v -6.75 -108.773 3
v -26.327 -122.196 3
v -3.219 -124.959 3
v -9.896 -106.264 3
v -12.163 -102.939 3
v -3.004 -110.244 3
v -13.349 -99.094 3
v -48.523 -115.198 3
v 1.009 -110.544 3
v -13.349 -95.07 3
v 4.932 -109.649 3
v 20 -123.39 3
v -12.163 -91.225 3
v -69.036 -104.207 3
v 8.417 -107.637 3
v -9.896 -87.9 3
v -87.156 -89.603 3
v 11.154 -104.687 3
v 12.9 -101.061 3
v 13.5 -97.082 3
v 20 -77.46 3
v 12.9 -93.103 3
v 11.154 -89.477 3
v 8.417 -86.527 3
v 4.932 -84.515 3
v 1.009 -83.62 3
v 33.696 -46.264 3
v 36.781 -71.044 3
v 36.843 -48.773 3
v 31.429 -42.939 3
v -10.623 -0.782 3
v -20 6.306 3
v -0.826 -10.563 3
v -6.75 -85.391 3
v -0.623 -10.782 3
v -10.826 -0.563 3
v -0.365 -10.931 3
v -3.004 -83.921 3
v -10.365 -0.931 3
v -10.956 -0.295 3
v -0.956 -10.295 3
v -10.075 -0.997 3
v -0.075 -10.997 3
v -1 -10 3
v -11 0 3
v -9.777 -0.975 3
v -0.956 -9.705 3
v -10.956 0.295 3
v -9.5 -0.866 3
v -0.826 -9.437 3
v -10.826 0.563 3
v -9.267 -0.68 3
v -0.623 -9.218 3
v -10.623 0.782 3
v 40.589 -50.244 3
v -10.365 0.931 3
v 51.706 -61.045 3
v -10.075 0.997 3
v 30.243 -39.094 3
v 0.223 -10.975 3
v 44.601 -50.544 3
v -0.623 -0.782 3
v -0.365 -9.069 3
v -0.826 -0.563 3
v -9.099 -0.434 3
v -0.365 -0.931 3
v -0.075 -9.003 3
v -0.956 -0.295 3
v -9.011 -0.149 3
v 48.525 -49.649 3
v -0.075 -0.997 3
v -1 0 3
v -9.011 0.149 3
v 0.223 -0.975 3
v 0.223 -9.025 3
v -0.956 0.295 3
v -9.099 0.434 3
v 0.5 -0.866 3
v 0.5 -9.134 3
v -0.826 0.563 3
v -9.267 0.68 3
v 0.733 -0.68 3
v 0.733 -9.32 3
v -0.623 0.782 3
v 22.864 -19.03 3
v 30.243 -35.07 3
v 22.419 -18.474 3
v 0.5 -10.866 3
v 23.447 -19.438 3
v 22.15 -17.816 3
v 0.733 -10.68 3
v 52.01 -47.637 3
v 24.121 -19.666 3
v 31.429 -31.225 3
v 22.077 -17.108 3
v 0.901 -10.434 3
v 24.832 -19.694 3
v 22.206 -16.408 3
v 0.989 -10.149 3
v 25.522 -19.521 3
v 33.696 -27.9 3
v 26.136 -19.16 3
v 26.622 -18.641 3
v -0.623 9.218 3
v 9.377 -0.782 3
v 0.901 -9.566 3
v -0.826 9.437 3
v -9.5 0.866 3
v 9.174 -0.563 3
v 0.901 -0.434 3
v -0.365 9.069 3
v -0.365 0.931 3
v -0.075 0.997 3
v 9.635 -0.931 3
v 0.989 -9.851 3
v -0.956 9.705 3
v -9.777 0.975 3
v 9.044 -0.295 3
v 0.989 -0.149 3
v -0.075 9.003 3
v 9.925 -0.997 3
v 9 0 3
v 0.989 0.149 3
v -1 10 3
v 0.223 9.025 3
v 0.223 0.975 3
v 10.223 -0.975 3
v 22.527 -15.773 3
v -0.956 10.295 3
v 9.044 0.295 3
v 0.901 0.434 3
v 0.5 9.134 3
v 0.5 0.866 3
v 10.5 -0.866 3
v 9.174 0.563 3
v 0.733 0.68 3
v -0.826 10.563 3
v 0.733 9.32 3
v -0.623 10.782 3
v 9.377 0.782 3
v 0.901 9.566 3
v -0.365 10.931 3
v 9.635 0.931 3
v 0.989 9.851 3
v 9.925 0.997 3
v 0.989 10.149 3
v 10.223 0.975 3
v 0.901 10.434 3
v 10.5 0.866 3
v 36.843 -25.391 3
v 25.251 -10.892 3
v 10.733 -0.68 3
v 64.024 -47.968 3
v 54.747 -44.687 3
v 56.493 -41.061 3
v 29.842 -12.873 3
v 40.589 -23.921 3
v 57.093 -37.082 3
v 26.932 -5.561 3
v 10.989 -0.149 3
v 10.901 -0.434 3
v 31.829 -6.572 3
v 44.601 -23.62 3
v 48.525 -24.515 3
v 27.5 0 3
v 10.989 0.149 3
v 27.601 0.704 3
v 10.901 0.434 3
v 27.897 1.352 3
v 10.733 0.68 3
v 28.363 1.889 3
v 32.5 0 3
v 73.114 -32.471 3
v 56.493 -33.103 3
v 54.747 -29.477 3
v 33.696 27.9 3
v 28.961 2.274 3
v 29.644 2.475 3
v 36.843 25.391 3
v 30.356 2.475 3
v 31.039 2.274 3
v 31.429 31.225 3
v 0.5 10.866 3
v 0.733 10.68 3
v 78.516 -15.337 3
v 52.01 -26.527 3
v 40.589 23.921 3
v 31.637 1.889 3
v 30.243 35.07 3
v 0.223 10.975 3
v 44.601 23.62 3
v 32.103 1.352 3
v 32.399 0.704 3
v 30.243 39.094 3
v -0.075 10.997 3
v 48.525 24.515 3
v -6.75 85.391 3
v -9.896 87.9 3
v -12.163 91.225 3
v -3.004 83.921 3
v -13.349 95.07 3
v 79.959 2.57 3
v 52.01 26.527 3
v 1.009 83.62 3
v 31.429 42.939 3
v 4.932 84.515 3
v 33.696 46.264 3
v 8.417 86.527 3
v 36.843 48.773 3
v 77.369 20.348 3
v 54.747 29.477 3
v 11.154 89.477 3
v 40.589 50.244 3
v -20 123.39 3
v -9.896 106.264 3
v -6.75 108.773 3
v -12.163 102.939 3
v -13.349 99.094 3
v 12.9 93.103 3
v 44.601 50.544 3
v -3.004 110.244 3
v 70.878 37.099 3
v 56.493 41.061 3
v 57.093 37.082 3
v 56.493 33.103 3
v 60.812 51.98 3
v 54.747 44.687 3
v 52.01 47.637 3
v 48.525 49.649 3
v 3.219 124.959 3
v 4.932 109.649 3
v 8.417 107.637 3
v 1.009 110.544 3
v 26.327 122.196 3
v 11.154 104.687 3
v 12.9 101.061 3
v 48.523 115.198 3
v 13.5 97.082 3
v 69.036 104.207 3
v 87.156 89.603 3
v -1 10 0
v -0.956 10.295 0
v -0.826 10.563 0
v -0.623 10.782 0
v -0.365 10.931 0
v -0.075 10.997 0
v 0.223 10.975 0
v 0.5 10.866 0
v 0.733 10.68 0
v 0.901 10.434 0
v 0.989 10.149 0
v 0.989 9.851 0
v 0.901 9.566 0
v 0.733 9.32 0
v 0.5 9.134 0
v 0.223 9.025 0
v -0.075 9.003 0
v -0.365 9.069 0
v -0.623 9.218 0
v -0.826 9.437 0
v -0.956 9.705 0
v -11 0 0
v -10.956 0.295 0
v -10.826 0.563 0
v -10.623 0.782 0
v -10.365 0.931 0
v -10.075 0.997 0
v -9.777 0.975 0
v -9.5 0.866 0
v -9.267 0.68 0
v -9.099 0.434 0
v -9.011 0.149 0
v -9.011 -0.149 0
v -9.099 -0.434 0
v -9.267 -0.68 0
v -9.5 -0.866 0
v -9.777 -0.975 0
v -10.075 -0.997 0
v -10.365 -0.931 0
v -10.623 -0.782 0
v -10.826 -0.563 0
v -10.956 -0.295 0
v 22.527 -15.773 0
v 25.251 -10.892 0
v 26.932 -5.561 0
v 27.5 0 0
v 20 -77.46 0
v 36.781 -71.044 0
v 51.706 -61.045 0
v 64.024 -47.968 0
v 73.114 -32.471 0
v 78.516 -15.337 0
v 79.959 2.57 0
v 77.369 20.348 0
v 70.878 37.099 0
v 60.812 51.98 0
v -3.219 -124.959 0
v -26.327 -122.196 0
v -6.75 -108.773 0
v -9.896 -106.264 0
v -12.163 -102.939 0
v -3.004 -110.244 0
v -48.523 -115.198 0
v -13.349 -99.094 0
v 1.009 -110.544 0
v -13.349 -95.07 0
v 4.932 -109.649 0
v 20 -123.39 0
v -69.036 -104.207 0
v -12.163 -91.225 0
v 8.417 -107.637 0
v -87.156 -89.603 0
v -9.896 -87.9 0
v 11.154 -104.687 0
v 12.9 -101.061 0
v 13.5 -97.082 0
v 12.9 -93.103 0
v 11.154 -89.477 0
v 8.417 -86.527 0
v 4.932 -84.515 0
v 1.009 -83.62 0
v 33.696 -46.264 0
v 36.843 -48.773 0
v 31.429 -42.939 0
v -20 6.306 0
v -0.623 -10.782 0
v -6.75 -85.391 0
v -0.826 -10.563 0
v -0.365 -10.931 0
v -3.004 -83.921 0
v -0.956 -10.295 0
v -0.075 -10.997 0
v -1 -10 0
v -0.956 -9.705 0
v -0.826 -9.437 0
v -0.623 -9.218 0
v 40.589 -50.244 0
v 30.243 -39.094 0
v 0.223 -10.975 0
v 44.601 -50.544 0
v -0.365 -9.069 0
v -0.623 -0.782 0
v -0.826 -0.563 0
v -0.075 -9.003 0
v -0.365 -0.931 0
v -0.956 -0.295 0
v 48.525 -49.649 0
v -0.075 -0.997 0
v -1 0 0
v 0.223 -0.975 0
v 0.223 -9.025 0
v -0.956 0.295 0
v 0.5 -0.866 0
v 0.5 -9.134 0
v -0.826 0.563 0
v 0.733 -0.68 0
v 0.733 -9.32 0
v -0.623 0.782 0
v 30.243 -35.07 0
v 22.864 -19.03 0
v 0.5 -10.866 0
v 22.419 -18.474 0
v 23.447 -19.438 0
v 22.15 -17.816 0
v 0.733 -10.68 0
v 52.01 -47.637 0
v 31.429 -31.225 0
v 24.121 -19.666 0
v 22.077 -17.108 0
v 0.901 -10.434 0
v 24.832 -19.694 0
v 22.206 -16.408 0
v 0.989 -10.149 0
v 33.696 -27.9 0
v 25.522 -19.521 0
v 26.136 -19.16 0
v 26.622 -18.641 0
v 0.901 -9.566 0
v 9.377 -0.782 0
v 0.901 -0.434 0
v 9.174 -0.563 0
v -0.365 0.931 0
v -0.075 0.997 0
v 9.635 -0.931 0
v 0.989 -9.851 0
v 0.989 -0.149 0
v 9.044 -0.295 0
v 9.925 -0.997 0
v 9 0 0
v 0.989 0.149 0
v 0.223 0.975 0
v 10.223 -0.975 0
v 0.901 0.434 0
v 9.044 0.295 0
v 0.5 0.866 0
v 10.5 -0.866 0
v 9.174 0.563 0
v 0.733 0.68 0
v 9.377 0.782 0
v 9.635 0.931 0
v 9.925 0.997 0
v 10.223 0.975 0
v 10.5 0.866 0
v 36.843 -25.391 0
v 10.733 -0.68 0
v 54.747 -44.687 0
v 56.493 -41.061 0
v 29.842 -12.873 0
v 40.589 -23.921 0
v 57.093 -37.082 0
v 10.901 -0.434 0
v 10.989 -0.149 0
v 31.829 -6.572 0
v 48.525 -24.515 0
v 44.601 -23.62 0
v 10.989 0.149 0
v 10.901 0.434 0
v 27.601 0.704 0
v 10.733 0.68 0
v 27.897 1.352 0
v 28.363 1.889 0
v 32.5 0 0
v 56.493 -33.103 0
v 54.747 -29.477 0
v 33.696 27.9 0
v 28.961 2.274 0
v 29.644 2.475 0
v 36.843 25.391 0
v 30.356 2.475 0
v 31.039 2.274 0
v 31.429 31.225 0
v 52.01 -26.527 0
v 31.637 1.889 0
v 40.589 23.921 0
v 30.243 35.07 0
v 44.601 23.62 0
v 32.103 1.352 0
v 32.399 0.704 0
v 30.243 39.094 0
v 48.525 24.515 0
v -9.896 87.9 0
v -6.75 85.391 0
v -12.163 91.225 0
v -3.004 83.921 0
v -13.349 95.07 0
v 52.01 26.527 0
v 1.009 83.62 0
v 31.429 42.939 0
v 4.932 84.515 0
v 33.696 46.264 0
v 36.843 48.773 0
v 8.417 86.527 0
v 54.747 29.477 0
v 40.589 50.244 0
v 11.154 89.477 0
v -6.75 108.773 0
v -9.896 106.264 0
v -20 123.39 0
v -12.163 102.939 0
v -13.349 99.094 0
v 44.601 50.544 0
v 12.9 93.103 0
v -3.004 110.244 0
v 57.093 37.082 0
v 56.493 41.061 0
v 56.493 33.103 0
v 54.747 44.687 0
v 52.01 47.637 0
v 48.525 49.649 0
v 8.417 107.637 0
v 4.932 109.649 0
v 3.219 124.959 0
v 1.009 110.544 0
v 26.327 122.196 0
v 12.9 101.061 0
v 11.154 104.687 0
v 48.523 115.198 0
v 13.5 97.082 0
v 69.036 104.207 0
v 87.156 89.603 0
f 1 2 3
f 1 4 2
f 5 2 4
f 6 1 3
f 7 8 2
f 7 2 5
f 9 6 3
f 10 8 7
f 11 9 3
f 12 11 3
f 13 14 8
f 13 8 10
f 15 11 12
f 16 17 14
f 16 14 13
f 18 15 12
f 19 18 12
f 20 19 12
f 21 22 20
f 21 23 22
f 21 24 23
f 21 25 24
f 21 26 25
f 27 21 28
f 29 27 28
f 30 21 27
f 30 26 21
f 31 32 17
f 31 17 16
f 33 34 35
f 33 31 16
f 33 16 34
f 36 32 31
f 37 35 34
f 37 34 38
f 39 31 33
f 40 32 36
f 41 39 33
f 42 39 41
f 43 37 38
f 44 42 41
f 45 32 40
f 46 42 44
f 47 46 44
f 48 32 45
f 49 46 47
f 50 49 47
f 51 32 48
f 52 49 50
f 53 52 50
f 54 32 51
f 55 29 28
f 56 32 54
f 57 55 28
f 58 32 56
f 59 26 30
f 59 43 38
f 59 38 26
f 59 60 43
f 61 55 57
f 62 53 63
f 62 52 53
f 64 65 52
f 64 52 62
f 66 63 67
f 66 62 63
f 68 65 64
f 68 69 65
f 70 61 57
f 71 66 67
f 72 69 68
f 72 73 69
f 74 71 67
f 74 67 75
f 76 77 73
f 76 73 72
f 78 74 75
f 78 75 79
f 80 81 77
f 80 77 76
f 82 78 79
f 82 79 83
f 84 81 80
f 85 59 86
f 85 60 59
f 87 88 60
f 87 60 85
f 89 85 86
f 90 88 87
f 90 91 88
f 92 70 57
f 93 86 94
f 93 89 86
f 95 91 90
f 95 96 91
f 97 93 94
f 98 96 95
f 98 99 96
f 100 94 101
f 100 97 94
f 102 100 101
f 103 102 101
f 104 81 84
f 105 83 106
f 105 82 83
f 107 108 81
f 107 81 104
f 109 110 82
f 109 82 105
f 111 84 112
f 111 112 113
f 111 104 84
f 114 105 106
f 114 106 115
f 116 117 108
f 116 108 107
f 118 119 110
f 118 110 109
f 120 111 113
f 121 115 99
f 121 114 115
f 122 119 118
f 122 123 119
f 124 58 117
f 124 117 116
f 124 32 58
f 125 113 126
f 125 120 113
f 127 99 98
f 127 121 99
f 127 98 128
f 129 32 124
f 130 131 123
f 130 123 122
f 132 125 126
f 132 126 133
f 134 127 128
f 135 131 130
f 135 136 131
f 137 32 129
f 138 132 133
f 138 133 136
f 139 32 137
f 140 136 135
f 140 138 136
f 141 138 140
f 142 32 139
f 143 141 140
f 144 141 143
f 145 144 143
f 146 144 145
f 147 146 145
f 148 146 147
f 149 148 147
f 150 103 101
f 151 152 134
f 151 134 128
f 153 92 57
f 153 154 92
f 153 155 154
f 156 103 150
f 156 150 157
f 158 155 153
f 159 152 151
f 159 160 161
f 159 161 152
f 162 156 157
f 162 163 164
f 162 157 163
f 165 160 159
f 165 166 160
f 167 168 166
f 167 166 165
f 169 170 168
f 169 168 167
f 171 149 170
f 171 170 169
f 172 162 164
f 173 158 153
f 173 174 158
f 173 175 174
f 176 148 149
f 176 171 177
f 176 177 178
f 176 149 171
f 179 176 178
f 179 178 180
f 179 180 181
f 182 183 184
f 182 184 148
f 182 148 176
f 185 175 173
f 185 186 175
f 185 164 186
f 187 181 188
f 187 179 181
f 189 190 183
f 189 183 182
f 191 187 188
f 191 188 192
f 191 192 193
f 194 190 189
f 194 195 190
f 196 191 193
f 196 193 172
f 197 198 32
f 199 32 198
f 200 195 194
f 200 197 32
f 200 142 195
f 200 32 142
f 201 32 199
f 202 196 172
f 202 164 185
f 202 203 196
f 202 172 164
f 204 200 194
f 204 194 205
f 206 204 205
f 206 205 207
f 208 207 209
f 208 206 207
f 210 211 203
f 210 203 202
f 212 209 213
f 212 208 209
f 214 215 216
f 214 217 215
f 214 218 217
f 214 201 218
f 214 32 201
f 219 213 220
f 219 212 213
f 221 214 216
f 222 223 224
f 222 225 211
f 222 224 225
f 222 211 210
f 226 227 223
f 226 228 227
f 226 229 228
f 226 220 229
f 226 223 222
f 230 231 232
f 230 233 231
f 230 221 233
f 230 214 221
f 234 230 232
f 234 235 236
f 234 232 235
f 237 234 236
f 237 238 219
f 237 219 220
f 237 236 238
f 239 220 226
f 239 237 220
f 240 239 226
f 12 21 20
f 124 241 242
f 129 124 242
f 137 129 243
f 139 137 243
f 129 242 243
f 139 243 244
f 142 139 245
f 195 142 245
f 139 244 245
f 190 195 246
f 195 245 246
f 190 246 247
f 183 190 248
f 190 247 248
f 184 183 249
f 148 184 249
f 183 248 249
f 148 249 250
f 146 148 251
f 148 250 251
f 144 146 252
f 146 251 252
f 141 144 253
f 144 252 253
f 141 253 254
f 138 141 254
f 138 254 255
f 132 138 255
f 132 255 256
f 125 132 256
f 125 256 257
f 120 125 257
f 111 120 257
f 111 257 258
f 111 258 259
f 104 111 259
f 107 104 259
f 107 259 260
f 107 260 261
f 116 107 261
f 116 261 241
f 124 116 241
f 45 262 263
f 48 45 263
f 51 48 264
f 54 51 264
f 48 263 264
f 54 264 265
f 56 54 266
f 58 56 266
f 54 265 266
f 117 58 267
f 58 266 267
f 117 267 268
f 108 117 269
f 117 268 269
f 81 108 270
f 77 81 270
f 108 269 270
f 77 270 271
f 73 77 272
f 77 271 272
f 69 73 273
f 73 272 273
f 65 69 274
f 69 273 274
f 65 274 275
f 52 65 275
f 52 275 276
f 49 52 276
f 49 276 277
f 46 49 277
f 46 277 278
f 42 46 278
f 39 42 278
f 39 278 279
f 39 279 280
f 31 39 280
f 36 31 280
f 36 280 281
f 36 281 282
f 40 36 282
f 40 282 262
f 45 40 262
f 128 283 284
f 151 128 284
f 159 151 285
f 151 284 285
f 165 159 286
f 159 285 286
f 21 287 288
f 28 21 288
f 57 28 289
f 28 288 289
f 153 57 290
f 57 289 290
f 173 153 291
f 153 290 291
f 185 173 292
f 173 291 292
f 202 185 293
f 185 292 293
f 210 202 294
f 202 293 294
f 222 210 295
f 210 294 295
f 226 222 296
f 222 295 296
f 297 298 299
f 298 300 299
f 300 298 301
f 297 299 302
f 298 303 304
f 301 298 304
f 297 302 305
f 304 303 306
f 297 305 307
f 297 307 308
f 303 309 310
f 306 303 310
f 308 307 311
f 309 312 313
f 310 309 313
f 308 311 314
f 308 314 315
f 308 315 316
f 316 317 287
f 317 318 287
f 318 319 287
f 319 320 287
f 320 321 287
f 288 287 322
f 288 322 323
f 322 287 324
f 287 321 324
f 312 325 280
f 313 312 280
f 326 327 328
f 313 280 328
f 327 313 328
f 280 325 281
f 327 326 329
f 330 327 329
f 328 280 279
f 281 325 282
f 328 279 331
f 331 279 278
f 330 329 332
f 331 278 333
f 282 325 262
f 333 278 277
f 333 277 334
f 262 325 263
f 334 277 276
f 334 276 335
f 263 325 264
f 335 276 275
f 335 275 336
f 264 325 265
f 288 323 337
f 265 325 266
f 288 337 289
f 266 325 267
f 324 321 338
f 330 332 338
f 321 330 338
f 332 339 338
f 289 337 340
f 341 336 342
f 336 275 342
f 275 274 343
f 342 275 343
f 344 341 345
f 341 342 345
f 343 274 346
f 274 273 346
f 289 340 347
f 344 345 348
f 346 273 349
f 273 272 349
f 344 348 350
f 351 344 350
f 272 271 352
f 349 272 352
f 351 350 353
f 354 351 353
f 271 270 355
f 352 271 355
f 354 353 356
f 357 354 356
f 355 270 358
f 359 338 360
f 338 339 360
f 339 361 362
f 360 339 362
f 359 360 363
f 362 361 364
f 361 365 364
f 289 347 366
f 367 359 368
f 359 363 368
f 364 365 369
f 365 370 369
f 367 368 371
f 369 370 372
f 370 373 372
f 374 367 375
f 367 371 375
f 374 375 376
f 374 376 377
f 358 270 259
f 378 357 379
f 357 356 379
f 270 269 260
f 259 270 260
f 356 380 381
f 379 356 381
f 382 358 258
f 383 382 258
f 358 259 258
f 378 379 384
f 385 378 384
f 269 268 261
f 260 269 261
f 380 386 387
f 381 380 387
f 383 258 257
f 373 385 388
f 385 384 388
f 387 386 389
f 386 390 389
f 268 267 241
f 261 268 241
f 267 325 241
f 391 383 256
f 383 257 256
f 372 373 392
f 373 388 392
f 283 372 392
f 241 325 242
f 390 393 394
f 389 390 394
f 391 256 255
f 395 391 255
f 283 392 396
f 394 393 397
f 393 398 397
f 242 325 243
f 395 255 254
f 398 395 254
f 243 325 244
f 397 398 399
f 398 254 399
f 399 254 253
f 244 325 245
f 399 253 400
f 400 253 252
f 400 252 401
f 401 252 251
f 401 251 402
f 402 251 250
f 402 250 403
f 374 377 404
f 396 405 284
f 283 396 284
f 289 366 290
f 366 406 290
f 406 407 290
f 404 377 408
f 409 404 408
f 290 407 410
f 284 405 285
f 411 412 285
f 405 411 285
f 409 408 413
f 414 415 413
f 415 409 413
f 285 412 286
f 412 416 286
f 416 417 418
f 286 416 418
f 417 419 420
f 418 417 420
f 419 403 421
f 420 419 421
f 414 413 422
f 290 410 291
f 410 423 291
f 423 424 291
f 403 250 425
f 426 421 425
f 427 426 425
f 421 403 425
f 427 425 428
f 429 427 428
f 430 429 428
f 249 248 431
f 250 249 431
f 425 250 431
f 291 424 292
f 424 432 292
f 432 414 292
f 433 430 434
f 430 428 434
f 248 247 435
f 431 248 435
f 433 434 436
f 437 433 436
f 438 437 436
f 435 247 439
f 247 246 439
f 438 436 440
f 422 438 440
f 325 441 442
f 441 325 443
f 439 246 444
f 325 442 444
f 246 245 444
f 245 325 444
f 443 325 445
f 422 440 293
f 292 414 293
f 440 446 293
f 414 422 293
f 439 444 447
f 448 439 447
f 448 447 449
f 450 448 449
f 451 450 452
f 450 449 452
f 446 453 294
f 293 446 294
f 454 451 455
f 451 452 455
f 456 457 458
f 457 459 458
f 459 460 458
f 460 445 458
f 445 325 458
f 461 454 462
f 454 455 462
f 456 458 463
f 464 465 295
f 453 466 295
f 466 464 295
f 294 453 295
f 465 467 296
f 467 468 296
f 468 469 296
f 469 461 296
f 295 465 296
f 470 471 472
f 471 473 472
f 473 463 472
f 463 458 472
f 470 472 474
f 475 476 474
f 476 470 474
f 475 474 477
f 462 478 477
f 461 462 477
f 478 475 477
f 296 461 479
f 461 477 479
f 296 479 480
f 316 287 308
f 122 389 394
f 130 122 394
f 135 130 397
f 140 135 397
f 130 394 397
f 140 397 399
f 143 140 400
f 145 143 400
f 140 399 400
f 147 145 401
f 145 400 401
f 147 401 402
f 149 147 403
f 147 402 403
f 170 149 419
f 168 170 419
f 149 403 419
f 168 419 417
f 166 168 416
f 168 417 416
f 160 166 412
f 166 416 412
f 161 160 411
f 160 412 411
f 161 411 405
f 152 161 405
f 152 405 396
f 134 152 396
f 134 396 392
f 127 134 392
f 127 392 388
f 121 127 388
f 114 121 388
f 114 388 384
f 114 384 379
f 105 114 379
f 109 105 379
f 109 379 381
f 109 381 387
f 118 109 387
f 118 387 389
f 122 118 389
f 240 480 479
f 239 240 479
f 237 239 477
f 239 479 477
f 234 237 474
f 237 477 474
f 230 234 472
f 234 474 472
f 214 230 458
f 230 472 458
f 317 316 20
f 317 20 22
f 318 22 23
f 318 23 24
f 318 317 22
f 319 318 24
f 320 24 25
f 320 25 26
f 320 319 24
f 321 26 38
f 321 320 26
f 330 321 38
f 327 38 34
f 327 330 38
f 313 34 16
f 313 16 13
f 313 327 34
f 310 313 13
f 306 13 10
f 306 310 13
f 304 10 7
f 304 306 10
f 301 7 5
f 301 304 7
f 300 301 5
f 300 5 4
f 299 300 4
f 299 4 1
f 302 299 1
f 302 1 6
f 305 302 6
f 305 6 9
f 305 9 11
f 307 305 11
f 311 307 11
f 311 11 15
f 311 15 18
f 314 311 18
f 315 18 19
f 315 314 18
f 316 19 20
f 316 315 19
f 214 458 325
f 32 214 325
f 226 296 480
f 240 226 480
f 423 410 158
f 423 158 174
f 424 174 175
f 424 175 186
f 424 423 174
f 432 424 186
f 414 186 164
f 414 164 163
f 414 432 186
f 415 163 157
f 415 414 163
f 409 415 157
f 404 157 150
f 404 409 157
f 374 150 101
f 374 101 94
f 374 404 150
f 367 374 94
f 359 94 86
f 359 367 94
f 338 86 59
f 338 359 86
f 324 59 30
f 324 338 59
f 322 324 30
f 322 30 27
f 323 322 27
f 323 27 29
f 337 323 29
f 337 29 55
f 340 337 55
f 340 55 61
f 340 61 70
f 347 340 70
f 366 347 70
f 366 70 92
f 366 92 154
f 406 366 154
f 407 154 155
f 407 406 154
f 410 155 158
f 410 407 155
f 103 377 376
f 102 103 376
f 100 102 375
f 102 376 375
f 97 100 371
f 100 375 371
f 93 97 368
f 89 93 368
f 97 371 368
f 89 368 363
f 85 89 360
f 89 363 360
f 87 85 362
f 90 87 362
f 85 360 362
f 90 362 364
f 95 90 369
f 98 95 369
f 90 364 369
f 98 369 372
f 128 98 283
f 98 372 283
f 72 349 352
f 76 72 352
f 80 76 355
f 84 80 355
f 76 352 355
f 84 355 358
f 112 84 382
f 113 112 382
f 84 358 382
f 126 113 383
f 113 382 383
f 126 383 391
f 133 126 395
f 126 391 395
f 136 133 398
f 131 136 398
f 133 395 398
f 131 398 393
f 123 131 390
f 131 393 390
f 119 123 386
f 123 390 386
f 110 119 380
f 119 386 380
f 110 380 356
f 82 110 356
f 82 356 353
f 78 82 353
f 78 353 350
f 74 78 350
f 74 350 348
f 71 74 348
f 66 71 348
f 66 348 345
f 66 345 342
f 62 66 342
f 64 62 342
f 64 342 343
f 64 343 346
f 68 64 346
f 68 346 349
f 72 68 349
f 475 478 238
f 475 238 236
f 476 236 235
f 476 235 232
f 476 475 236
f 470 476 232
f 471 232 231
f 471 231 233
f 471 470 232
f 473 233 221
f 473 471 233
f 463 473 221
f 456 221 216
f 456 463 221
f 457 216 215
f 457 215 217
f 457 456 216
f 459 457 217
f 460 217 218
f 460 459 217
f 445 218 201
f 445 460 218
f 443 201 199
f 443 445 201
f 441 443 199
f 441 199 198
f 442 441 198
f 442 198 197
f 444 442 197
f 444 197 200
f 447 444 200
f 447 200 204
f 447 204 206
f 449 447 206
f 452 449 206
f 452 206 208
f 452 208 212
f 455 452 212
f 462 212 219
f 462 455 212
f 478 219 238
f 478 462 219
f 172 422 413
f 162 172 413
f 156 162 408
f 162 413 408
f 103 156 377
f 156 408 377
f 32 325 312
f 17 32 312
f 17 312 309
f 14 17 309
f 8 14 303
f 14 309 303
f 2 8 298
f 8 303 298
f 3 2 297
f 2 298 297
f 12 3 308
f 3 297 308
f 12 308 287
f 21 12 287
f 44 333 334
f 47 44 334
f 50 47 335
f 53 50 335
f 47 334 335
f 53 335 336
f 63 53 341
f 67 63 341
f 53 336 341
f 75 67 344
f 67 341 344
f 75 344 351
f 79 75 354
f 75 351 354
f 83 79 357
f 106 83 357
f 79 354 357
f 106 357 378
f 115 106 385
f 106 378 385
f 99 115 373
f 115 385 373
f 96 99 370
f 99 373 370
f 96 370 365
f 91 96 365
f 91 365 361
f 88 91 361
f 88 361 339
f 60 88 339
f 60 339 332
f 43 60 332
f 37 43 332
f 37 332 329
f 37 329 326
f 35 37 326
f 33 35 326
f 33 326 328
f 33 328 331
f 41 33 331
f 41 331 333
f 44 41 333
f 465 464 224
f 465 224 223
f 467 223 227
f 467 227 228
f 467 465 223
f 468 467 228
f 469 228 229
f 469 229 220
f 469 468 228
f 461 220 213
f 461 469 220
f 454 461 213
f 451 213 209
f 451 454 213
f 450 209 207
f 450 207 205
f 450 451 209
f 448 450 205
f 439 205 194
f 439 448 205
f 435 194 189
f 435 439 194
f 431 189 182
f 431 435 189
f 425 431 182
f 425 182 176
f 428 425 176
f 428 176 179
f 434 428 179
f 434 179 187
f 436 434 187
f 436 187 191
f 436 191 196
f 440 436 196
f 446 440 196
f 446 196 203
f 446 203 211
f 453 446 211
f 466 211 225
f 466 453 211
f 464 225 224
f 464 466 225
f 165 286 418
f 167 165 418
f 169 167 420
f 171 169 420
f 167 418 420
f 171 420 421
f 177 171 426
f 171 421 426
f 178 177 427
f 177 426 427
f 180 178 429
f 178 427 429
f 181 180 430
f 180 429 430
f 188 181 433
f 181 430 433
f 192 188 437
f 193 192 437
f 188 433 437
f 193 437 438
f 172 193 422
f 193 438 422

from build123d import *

# Parameters (mm, degrees)
SKETCH1_R             = 13.5
BOSS_EXTRUDE1_DEPTH   = 3
F_2_0MM_DOWEL_HOLE1_D = 2


with BuildPart() as part:
    # Sketch1 → Boss-Extrude1 (new body)
    with BuildSketch(Plane.XY):
        with BuildLine():
            Line((-20, 123.389626793), (-20, 6.305975778))
            Line((-20, 6.305975778), (-87.156423304, -89.603336304))
            ThreePointArc((-87.156423304, -89.603336304), (-37.588224938, -119.214618844), (20, -123.389626793))
            Line((20, -123.389626793), (20, -77.459666924))
            ThreePointArc((20, -77.459666924), (76.29735606, -24.05646396), (60.812080601, 51.979715784))
            Line((60.812080601, 51.979715784), (87.156423304, 89.603336304))
            ThreePointArc((87.156423304, 89.603336304), (37.588224938, 119.214618844), (-20, 123.389626793))
        make_face()
        with Locations((0, -97.082039325)):
            Circle(SKETCH1_R, mode=Mode.SUBTRACT)
        with Locations((43.59255168, -37.082039325)):
            Circle(SKETCH1_R, mode=Mode.SUBTRACT)
        with BuildLine():
            ThreePointArc((32.5, 0), (30.995800899, -9.772938484), (26.622441439, -18.641234181))
            ThreePointArc((26.622441439, -18.641234181), (23.140620238, -19.255173201), (22.526681218, -15.773352))
            ThreePointArc((22.526681218, -15.773352), (26.227216146, -8.269409486), (27.5, 0))
            ThreePointArc((27.5, 0), (30, 2.5), (32.5, 0))
        make_face(mode=Mode.SUBTRACT)
        with Locations((43.59255168, 37.082039325)):
            Circle(SKETCH1_R, mode=Mode.SUBTRACT)
        with Locations((0, 97.082039325)):
            Circle(SKETCH1_R, mode=Mode.SUBTRACT)
    extrude(amount=BOSS_EXTRUDE1_DEPTH)

    # Ø2.0mm Dowel Hole1 (through all)
    with Locations(Plane.XY.offset(3)):
        with Locations((0, -10), (10, 0), (0, 10), (0, 0), (-10, 0)):
            Hole(F_2_0MM_DOWEL_HOLE1_D / 2)


solid = part.part
